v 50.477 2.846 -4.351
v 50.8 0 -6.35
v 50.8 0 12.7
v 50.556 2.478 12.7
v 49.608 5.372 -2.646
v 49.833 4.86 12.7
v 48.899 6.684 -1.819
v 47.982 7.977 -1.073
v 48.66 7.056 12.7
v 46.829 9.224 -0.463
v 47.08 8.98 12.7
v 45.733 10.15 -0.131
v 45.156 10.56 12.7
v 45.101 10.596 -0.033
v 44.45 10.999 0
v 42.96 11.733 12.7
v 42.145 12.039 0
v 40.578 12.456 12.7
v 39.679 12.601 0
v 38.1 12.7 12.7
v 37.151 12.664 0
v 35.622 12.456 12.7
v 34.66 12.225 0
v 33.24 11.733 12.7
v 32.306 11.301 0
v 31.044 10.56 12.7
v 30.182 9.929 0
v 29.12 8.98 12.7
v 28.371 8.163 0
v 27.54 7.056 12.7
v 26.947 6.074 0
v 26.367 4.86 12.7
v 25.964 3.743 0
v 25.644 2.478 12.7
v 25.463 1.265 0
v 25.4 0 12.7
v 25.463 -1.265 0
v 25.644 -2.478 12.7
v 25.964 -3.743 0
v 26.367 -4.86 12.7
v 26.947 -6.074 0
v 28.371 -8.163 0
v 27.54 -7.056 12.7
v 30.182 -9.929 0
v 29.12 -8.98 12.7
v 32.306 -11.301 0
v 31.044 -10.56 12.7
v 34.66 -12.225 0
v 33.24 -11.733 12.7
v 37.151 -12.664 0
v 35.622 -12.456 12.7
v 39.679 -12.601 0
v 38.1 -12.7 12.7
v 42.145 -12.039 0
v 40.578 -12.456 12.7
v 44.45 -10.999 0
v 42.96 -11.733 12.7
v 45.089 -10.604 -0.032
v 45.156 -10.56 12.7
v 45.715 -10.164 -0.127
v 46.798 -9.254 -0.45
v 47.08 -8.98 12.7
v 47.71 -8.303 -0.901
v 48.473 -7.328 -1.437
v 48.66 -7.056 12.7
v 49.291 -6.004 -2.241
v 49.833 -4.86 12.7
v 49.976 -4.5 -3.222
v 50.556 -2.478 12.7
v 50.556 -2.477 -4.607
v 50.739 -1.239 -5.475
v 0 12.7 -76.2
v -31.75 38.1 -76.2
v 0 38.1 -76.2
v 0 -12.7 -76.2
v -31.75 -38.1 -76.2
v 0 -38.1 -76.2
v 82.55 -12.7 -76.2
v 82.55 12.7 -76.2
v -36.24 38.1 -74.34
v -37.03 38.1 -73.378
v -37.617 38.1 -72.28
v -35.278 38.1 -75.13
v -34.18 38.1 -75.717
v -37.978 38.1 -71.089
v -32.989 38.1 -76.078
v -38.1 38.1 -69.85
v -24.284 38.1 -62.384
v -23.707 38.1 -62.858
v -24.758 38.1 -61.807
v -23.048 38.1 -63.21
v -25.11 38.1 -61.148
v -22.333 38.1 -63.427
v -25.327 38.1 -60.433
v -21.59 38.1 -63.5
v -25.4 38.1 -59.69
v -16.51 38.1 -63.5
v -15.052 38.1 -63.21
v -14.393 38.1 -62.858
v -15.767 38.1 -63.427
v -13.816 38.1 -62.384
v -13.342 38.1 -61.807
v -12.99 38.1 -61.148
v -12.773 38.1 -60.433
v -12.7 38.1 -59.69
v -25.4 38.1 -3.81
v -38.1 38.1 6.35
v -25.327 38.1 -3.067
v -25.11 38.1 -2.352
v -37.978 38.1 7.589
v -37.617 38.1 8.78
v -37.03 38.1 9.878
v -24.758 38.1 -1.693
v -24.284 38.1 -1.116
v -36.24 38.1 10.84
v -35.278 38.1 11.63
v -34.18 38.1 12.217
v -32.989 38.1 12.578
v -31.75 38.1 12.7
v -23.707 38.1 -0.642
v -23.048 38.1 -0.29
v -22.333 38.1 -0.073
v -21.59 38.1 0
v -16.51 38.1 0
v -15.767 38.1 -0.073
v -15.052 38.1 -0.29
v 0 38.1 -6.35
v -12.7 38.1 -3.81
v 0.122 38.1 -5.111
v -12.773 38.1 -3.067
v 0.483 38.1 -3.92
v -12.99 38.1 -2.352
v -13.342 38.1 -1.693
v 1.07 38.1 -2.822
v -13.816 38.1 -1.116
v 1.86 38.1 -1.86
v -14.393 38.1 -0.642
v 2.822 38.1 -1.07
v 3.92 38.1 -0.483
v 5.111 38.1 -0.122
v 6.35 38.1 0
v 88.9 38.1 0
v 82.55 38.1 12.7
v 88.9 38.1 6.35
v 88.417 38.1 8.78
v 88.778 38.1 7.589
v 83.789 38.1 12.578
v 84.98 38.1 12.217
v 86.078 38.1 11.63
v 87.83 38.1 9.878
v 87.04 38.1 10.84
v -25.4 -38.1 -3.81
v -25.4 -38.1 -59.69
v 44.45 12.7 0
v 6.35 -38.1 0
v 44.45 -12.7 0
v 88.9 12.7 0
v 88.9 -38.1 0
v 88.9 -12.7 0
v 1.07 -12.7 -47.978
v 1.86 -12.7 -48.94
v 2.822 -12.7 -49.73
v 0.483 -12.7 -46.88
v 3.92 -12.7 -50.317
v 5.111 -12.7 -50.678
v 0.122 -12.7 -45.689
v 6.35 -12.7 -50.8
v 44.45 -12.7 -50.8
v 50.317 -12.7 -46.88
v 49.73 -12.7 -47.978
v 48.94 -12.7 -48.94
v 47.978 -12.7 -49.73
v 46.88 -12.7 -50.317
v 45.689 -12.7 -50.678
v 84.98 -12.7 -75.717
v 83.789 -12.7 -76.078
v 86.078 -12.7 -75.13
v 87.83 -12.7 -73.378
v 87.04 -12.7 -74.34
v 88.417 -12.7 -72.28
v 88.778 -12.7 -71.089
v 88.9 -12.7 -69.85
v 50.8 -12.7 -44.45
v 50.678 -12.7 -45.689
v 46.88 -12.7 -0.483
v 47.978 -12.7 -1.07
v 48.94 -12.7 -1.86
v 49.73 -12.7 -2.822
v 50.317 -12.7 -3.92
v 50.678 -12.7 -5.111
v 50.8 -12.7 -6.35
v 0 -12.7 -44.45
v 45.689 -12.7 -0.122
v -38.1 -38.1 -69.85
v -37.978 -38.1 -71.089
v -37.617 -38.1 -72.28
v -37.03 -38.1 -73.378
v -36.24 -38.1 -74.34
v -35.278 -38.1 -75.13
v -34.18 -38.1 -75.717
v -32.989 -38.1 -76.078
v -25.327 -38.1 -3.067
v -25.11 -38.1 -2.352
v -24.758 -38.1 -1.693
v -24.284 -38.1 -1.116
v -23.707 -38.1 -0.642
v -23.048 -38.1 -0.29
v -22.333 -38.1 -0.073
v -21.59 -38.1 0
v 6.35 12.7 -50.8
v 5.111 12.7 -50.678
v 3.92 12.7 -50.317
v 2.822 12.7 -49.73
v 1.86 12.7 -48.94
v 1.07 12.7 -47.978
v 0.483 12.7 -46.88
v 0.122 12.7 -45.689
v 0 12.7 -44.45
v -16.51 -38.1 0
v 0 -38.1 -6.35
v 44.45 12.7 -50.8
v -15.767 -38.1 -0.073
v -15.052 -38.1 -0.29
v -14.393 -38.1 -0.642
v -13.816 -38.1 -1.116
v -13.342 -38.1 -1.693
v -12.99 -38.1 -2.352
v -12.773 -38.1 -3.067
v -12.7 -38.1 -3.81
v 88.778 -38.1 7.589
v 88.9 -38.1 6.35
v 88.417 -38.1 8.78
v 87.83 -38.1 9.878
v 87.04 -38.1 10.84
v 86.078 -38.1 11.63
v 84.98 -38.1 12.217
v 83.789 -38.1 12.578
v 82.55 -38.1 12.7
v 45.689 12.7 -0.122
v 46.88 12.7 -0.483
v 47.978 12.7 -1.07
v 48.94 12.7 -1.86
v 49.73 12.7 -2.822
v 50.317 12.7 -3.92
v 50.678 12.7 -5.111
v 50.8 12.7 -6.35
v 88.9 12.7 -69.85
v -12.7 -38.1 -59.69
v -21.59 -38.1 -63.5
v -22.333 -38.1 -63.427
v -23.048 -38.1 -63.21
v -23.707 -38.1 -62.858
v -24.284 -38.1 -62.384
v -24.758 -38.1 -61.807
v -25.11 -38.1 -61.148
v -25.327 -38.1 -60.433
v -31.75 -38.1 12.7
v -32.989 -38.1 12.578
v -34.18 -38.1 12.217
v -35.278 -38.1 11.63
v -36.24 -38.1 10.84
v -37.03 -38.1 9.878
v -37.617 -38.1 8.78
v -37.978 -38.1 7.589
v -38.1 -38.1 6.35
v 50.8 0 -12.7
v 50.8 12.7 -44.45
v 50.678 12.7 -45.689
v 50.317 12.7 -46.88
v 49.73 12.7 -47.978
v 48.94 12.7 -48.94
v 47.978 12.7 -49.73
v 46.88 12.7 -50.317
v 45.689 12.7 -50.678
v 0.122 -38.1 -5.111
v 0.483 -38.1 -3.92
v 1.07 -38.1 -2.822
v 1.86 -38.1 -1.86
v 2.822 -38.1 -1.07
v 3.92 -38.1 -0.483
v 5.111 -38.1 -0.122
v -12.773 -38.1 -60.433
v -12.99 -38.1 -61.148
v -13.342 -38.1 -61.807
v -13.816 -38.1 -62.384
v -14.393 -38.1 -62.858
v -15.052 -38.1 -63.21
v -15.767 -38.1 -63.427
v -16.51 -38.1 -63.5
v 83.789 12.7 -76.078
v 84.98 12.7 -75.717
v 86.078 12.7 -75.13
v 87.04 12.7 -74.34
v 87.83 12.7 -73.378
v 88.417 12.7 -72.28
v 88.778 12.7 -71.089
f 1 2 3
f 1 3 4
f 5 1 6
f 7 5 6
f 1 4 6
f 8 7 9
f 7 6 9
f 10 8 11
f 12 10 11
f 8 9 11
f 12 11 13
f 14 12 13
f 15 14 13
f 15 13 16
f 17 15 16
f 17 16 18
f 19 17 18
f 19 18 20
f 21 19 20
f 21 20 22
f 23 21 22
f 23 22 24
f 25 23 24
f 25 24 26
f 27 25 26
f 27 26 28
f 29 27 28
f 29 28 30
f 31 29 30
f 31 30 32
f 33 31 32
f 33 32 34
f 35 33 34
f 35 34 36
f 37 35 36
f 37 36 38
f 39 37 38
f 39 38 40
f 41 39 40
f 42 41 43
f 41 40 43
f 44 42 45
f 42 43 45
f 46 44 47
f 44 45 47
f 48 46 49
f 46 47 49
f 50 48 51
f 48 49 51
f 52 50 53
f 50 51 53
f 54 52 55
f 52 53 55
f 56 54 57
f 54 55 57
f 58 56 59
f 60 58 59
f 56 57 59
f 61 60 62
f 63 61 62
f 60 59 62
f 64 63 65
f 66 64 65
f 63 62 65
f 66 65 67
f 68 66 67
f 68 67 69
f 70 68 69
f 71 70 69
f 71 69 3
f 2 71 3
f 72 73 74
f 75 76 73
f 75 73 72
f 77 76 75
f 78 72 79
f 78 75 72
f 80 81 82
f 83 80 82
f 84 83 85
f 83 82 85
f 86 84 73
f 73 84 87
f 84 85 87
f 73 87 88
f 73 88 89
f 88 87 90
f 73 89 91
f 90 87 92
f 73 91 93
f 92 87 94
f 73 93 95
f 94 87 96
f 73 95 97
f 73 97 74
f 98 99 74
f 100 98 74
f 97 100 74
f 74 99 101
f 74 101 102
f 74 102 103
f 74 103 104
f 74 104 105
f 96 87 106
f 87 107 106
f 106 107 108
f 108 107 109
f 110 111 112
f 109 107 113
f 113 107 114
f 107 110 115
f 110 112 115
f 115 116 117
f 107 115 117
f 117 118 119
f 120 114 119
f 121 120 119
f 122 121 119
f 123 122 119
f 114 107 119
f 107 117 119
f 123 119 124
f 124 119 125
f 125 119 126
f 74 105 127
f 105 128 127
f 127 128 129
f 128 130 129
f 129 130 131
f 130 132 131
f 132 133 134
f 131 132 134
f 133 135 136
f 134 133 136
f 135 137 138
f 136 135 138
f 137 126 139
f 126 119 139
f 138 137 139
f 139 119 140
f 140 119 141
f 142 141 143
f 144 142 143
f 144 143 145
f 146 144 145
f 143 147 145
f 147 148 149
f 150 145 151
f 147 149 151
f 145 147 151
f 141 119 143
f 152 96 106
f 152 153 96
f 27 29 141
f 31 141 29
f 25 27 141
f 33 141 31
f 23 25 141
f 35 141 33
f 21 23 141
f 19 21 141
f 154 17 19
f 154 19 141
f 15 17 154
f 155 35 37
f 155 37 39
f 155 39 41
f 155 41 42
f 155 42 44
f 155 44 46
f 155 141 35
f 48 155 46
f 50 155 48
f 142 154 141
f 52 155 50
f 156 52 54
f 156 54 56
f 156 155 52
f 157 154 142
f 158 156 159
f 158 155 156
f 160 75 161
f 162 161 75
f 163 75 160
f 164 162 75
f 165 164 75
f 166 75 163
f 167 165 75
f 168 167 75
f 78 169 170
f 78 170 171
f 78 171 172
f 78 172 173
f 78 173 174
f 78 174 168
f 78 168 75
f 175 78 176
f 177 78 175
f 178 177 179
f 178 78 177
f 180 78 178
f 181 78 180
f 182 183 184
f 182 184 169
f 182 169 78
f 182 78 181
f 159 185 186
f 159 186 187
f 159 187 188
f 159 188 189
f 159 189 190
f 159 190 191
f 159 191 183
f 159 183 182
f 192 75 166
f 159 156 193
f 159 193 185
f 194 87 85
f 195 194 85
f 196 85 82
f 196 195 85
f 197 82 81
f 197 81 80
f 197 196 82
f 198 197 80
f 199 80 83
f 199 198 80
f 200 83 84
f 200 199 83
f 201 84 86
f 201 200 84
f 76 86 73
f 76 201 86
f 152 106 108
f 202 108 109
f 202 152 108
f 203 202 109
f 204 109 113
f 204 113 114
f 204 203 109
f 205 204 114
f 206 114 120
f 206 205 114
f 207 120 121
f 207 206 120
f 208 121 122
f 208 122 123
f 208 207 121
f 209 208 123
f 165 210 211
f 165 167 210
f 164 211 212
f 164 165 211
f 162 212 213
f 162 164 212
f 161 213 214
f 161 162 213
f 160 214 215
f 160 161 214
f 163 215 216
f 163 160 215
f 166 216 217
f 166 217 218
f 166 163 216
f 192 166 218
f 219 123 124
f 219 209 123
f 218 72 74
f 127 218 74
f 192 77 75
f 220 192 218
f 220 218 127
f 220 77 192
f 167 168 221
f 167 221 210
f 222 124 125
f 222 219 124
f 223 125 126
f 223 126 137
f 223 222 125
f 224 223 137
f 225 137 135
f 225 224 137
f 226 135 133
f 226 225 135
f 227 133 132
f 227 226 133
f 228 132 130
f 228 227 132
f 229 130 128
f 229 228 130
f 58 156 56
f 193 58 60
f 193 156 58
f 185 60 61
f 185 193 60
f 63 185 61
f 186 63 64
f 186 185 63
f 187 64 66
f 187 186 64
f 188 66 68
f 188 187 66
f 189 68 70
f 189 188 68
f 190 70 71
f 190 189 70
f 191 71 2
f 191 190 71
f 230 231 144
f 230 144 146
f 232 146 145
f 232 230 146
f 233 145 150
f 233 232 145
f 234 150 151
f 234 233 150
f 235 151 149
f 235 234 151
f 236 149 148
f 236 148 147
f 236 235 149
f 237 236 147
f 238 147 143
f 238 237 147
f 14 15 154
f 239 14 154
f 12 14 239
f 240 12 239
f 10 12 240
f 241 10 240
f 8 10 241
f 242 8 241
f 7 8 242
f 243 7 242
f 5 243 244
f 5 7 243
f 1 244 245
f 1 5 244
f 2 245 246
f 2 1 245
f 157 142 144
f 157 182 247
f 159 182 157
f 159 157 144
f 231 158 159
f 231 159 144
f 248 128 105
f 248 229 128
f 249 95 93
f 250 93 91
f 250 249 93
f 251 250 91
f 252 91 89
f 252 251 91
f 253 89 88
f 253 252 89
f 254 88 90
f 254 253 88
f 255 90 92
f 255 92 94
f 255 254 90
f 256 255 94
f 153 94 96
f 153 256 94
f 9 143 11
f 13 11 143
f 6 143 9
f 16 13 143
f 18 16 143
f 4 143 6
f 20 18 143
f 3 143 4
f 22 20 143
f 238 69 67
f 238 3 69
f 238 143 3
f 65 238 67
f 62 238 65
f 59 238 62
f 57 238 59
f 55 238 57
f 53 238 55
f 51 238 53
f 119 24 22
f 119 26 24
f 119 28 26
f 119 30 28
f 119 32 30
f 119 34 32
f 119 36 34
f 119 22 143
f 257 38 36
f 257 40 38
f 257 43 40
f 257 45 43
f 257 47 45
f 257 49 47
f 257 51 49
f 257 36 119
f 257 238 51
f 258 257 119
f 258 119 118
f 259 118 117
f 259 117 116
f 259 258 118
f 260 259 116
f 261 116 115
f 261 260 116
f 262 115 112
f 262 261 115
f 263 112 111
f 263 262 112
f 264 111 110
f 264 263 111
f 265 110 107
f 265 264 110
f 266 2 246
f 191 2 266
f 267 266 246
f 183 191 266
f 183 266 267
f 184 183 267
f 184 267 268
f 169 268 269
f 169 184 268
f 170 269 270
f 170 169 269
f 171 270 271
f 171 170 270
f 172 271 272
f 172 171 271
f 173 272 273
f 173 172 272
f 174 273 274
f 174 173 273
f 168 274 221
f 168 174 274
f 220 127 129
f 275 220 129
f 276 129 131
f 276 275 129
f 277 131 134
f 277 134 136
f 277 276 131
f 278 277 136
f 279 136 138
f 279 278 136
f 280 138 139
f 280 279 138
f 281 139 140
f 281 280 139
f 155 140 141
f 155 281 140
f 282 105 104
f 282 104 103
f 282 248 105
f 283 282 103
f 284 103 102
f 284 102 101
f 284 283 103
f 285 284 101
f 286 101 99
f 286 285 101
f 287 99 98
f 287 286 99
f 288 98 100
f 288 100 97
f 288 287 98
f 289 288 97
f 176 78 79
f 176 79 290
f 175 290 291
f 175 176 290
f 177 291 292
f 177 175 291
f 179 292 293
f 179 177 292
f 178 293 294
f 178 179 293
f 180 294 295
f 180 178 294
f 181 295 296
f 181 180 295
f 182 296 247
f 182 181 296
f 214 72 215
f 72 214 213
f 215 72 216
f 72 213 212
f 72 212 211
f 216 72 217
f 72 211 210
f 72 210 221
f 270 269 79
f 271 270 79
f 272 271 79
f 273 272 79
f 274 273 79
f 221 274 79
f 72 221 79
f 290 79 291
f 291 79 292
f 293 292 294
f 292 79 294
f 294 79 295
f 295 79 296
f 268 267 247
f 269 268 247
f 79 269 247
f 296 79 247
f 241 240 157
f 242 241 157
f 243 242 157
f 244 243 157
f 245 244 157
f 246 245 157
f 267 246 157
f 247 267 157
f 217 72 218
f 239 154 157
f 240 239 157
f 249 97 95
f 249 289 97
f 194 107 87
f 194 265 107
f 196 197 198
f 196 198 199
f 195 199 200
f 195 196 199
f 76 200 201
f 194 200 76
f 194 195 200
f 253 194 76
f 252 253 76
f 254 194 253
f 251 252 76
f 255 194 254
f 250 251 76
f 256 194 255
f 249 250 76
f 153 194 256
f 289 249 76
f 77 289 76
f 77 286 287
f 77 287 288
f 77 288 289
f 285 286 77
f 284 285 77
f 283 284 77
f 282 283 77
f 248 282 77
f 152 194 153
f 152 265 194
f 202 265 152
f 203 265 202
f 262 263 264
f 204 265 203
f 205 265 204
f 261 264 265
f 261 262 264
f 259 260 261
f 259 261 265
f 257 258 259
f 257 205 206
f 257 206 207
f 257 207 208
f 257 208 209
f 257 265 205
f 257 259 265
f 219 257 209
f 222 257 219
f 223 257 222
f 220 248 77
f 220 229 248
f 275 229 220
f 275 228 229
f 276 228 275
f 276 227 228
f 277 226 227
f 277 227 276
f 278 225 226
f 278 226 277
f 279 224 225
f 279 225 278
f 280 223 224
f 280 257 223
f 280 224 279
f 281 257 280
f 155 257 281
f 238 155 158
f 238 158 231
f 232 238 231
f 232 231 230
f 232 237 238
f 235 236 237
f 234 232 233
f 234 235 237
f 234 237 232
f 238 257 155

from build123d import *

# Parameters (mm, degrees)
F1_DEPTH = 38.1
F2_DEPTH = 12.7
F3_R     = 12.7
F4_DEPTH = 25.4


with BuildPart() as f1:
    # F0 (on Front) → F1 (new body, symmetric)
    with BuildSketch(Plane.XZ):
        with BuildLine():
            ThreePointArc((0, -6.35), (1.8598719395, -1.8598719395), (6.35, 0))
            Line((6.35, 0), (44.45, 0))
            Line((44.45, 0), (88.9, 0))
            Line((88.9, 0), (88.9, 6.35))
            ThreePointArc((88.9, 6.35), (87.0401280605, 10.8401280605), (82.55, 12.7))
            Line((82.55, 12.7), (-31.75, 12.7))
            ThreePointArc((-31.75, 12.7), (-36.2401280605, 10.8401280605), (-38.1, 6.35))
            Line((-38.1, 6.35), (-38.1, -69.85))
            ThreePointArc((-38.1, -69.85), (-36.2401280605, -74.3401280605), (-31.75, -76.2))
            Line((-31.75, -76.2), (0, -76.2))
            Line((0, -76.2), (0, -44.45))
            Line((0, -44.45), (0, -6.35))
        make_face()
        with BuildLine():
            ThreePointArc((-25.4, -3.81), (-24.2840768363, -1.1159231637), (-21.59, 0))
            Line((-21.59, 0), (-16.51, 0))
            ThreePointArc((-16.51, 0), (-13.8159231637, -1.1159231637), (-12.7, -3.81))
            Line((-12.7, -3.81), (-12.7, -59.69))
            ThreePointArc((-12.7, -59.69), (-13.8159231637, -62.3840768363), (-16.51, -63.5))
            Line((-16.51, -63.5), (-21.59, -63.5))
            ThreePointArc((-21.59, -63.5), (-24.2840768363, -62.3840768363), (-25.4, -59.69))
            Line((-25.4, -59.69), (-25.4, -3.81))
        make_face(mode=Mode.SUBTRACT)
    extrude(amount=F1_DEPTH, both=True)

    # F0 (on Front) → F2 (join, symmetric)
    with BuildSketch(Plane.XZ):
        with BuildLine():
            ThreePointArc((0, -6.35), (1.8598719395, -1.8598719395), (6.35, 0))
            Line((6.35, 0), (44.45, 0))
            Line((44.45, 0), (88.9, 0))
            Line((88.9, 0), (88.9, 6.35))
            ThreePointArc((88.9, 6.35), (87.0401280605, 10.8401280605), (82.55, 12.7))
            Line((82.55, 12.7), (-31.75, 12.7))
            ThreePointArc((-31.75, 12.7), (-36.2401280605, 10.8401280605), (-38.1, 6.35))
            Line((-38.1, 6.35), (-38.1, -69.85))
            ThreePointArc((-38.1, -69.85), (-36.2401280605, -74.3401280605), (-31.75, -76.2))
            Line((-31.75, -76.2), (0, -76.2))
            Line((0, -76.2), (0, -44.45))
            Line((0, -44.45), (0, -6.35))
        make_face()
        with BuildLine():
            ThreePointArc((-25.4, -3.81), (-24.2840768363, -1.1159231637), (-21.59, 0))
            Line((-21.59, 0), (-16.51, 0))
            ThreePointArc((-16.51, 0), (-13.8159231637, -1.1159231637), (-12.7, -3.81))
            Line((-12.7, -3.81), (-12.7, -59.69))
            ThreePointArc((-12.7, -59.69), (-13.8159231637, -62.3840768363), (-16.51, -63.5))
            Line((-16.51, -63.5), (-21.59, -63.5))
            ThreePointArc((-21.59, -63.5), (-24.2840768363, -62.3840768363), (-25.4, -59.69))
            Line((-25.4, -59.69), (-25.4, -3.81))
        make_face(mode=Mode.SUBTRACT)
        with BuildLine():
            Line((88.9, 0), (44.45, 0))
            ThreePointArc((44.45, 0), (48.9401280605, -1.8598719395), (50.8, -6.35))
            Line((50.8, -6.35), (50.8, -44.45))
            ThreePointArc((50.8, -44.45), (48.9401280605, -48.9401280605), (44.45, -50.8))
            Line((44.45, -50.8), (6.35, -50.8))
            ThreePointArc((6.35, -50.8), (1.8598719395, -48.9401280605), (0, -44.45))
            Line((0, -44.45), (0, -76.2))
            Line((0, -76.2), (82.55, -76.2))
            ThreePointArc((82.55, -76.2), (87.0401280605, -74.3401280605), (88.9, -69.85))
            Line((88.9, -69.85), (88.9, 0))
        make_face()
    extrude(amount=F2_DEPTH, both=True)

    # F3 (on face) → F4 (cut)
    with BuildSketch(Plane.XY.offset(12.7)):
        with Locations((38.1, 0)):
            Circle(F3_R)
    extrude(amount=-F4_DEPTH, mode=Mode.SUBTRACT)


solid = f1.part
